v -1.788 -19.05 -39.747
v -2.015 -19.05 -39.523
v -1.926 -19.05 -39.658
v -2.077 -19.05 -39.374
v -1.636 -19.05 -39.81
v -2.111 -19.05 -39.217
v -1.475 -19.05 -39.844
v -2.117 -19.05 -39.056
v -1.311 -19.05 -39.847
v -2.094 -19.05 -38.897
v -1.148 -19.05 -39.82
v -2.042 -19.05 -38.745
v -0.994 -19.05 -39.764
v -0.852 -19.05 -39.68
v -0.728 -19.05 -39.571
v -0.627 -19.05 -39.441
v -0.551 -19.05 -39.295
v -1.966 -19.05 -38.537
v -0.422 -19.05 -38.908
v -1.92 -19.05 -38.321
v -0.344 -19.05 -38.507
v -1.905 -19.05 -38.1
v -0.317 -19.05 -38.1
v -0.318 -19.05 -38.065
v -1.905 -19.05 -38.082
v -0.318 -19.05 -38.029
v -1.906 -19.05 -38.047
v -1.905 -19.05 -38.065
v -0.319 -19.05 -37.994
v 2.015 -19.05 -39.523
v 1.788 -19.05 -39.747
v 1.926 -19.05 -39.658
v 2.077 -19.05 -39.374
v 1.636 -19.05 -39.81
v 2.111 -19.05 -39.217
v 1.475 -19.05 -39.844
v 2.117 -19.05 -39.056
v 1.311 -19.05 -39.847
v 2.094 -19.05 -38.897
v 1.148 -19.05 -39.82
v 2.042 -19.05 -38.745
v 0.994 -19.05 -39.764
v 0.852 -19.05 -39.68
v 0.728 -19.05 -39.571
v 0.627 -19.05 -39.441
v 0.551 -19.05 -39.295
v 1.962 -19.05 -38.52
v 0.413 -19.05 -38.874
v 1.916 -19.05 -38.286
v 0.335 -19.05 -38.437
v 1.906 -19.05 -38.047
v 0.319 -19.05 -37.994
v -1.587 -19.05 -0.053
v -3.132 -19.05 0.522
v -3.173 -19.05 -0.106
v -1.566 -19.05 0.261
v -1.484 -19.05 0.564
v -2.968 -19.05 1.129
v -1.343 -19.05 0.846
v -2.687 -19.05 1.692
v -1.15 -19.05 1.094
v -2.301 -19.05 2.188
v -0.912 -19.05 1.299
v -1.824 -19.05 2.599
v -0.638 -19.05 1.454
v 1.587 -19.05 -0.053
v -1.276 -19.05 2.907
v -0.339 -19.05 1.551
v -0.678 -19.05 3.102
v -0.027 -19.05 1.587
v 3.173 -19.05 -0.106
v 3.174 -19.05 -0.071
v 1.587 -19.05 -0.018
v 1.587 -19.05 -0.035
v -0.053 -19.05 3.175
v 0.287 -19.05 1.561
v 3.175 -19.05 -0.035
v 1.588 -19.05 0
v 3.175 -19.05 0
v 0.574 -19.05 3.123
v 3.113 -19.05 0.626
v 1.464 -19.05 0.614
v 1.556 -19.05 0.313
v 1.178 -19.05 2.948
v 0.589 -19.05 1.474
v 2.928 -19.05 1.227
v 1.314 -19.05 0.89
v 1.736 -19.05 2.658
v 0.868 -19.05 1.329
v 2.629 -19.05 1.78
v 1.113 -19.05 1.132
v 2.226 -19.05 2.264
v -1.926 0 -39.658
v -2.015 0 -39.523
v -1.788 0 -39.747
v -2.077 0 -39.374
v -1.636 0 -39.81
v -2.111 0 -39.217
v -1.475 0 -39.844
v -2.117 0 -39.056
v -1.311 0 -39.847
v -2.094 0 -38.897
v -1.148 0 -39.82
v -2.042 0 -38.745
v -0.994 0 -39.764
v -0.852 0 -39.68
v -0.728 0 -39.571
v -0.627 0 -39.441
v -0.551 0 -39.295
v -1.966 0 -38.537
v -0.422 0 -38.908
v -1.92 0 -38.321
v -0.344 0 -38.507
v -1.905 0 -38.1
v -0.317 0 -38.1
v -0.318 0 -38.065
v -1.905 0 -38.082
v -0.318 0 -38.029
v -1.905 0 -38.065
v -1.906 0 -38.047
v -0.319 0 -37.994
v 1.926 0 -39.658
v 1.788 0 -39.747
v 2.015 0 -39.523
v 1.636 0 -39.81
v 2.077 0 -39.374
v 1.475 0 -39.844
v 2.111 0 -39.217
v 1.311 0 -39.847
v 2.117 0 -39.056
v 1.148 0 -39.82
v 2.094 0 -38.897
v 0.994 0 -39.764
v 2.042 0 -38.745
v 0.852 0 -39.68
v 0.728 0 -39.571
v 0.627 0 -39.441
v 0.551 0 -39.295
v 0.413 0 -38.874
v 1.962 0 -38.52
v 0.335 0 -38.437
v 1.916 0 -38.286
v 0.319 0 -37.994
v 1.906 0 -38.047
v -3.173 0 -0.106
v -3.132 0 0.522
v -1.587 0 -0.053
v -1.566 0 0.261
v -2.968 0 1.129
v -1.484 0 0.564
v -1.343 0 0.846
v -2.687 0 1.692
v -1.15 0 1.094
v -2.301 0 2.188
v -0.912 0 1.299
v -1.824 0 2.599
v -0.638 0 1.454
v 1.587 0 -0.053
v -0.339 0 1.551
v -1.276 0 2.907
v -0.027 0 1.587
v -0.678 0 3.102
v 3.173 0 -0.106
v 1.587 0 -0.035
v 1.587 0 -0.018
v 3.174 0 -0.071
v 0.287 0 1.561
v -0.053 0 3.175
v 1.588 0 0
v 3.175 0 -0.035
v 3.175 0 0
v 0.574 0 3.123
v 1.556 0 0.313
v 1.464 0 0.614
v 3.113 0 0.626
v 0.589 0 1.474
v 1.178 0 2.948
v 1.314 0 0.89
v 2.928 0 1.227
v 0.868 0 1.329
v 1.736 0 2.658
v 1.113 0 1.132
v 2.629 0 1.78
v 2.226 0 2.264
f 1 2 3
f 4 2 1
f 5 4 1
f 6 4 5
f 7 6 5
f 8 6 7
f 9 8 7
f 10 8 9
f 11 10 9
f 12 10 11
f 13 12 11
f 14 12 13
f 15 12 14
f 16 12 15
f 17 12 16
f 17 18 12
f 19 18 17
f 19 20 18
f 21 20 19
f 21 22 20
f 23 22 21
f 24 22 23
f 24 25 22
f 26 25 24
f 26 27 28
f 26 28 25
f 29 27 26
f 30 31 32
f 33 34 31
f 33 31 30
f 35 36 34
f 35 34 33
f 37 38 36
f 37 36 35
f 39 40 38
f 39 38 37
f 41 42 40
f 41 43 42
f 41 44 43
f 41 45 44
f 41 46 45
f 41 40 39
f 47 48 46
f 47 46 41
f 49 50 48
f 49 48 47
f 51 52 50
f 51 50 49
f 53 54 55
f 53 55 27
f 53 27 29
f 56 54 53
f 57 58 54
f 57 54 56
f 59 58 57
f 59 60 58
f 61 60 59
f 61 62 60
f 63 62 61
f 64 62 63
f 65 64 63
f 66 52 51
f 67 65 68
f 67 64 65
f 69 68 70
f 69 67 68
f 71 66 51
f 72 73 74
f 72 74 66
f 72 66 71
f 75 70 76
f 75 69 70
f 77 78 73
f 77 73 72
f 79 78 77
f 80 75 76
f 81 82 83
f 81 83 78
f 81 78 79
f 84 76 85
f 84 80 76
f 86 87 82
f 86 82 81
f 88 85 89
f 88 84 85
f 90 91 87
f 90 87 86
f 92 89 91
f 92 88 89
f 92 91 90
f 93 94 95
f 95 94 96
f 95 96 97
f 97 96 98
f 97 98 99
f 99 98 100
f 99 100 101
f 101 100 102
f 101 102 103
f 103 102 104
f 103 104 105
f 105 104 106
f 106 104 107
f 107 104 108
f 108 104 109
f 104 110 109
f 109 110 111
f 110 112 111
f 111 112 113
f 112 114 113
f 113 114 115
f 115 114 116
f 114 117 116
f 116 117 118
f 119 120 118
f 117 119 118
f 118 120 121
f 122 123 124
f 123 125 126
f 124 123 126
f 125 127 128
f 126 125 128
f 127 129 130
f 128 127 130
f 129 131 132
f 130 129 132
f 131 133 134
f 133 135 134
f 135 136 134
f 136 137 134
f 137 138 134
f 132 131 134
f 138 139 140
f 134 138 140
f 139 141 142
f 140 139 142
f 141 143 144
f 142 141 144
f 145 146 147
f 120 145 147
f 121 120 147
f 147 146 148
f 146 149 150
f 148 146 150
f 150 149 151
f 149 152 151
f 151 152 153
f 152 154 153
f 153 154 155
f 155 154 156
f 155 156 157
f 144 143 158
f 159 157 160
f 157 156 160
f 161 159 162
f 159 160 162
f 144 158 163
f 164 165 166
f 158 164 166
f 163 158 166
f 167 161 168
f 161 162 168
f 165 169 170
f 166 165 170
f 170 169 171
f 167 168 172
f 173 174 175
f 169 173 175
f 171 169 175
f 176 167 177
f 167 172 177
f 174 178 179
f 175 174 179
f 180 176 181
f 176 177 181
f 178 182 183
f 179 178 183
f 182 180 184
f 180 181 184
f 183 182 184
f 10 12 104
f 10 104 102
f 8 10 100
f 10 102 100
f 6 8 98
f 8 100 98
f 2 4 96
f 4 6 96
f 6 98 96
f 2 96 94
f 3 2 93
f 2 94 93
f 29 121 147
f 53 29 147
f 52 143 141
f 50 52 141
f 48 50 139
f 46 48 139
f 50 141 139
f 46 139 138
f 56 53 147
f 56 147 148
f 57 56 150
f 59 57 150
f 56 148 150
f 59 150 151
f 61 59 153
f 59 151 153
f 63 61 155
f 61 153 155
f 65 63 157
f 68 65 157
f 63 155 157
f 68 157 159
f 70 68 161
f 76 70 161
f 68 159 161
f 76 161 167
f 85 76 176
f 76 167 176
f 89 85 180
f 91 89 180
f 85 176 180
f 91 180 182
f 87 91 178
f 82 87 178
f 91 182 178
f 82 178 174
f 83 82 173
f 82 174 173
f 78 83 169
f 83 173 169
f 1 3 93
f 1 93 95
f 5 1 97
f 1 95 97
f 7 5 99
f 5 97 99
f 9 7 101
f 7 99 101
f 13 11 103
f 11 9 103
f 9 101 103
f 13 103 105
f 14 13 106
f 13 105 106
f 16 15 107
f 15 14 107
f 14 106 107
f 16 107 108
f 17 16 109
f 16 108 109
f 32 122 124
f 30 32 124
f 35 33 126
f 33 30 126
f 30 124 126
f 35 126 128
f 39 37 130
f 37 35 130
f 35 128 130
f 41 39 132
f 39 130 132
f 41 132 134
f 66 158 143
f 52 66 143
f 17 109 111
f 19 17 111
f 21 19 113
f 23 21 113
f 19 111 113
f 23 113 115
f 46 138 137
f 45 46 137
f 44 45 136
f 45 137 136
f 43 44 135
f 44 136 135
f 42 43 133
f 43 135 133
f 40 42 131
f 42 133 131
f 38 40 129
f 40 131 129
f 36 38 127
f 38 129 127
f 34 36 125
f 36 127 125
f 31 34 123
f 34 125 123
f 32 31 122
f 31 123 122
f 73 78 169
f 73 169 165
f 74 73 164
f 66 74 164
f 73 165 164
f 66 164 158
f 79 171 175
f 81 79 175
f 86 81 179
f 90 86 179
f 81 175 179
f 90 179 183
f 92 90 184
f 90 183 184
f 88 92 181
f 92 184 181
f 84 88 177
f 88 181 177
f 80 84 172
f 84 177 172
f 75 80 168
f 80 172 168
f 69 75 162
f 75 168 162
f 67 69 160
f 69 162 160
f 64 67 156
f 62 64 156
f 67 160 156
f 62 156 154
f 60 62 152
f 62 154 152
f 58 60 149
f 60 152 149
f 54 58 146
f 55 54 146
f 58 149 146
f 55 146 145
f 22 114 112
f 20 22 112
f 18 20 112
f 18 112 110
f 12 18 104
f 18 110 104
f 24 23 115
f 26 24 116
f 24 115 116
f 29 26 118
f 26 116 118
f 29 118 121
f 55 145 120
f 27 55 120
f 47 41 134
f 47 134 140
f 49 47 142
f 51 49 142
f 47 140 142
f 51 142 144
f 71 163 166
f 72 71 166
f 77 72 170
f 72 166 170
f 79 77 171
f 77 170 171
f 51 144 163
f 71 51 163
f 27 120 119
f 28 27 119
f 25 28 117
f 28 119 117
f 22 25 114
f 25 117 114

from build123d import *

# Parameters (mm, degrees)
F1_DEPTH    = 19.05
F2_T1_DEPTH = 22.6696744492
F2_T3_DEPTH = 25.3488085544


# Not quite as in the source:
# - a fillet or chamfer that OpenCascade refuses, or shapes differently, is made with other operations: its cross-section is extruded or revolved along the edge and cut away or added


with BuildPart() as f1:
    # F0 (on Front) → F1 (new body)
    with BuildSketch(Plane.XZ):
        with BuildLine():
            ThreePointArc((-1.586615103, -0.0529977822), (-0.0265025846, 1.5872787603), (1.5875, 0))
            ThreePointArc((1.5875, 0), (1.5872787603, -0.0265025846), (1.586615103, -0.0529977822))
            Line((1.586615103, -0.0529977822), (1.4948202515, -2.8010957527))
            ThreePointArc((1.4948202515, -2.8010957527), (2.6951001882, -1.6784099545), (3.173230206, -0.1059955644))
            ThreePointArc((3.173230206, -0.1059955644), (3.1745575207, -0.0530051692), (3.175, 0))
            ThreePointArc((3.175, 0), (-0.0530051692, 3.1745575207), (-3.173230206, -0.1059955644))
            ThreePointArc((-3.173230206, -0.1059955644), (-2.6951001882, -1.6784099545), (-1.4948202515, -2.8010957527))
            Line((-1.4948202515, -2.8010957527), (-1.586615103, -0.0529977822))
        make_face()
        with BuildLine():
            Line((-0.319269794, -37.9940044356), (-1.4948202515, -2.8010957527))
            ThreePointArc((-1.4948202515, -2.8010957527), (-2.6951001882, -1.6784099545), (-3.173230206, -0.1059955644))
            Line((-3.173230206, -0.1059955644), (-1.9976797485, -35.2989042473))
            ThreePointArc((-1.9976797485, -35.2989042473), (-0.7973998118, -36.4215900455), (-0.319269794, -37.9940044356))
        make_face()
        with BuildLine():
            ThreePointArc((3.173230206, -0.1059955644), (2.6951001882, -1.6784099545), (1.4948202515, -2.8010957527))
            Line((1.4948202515, -2.8010957527), (0.319269794, -37.9940044356))
            ThreePointArc((0.319269794, -37.9940044356), (0.7973998118, -36.4215900455), (1.9976797485, -35.2989042473))
            Line((1.9976797485, -35.2989042473), (3.173230206, -0.1059955644))
        make_face()
        with BuildLine():
            ThreePointArc((-0.3175, -38.1), (-0.3179424793, -38.0469948308), (-0.319269794, -37.9940044356))
            ThreePointArc((-0.319269794, -37.9940044356), (-0.7973998118, -36.4215900455), (-1.9976797485, -35.2989042473))
            Line((-1.9976797485, -35.2989042473), (-1.905884897, -38.0470022178))
            ThreePointArc((-1.905884897, -38.0470022178), (-1.9052212397, -38.0734974154), (-1.905, -38.1))
            ThreePointArc((-1.905, -38.1), (-2.0258412421, -38.7075099489), (-2.3699679849, -39.2225320151))
            Line((-2.3699679849, -39.2225320151), (-1.2474359697, -40.3450640303))
            ThreePointArc((-1.2474359697, -40.3450640303), (-0.5591824843, -39.3150198978), (-0.3175, -38.1))
        make_face()
        with BuildLine():
            ThreePointArc((1.9976797485, -35.2989042473), (0.7973998118, -36.4215900455), (0.319269794, -37.9940044356))
            ThreePointArc((0.319269794, -37.9940044356), (0.5393070818, -39.2658801773), (1.2474359697, -40.3450640303))
            Line((1.2474359697, -40.3450640303), (2.3699679849, -39.2225320151))
            ThreePointArc((2.3699679849, -39.2225320151), (2.0159035409, -38.6829400886), (1.905884897, -38.0470022178))
            Line((1.905884897, -38.0470022178), (1.9976797485, -35.2989042473))
        make_face()
    extrude(amount=F1_DEPTH)

    # F2: fillet of radius 0.889 on 4 edges, made by hand

    # F2_s2 → F2_t1 (cut)
    with BuildSketch(Plane.XZ.offset(-1.8098372246)):
        with BuildLine():
            ThreePointArc((-2.0418274273, -38.7447521515), (-2.1035117306, -39.2681046567), (-1.8580687151, -39.7344312849))
            Line((-1.8580687151, -39.7344312849), (-2.3699679849, -39.2225320151))
            ThreePointArc((-2.3699679849, -39.2225320151), (-2.1839076792, -38.9987448959), (-2.0418274273, -38.7447521515))
        make_face()
        with BuildLine():
            ThreePointArc((1.8580687151, -39.7344312849), (2.1035117306, -39.2681046567), (2.0418274273, -38.7447521515))
            ThreePointArc((2.0418274273, -38.7447521515), (2.1839076792, -38.9987448959), (2.3699679849, -39.2225320151))
            Line((2.3699679849, -39.2225320151), (1.8580687151, -39.7344312849))
        make_face()
    extrude(amount=F2_T1_DEPTH, mode=Mode.SUBTRACT)

    # F2_s4 → F2_t3 (cut)
    with BuildSketch(Plane.XZ.offset(-3.1494042772)):
        with BuildLine():
            ThreePointArc((-2.0032929963, -39.5892070037), (-1.1983084283, -39.8319189832), (-0.551076483, -39.2952626045))
            ThreePointArc((-0.551076483, -39.2952626045), (-0.8466666667, -39.8550472849), (-1.2474359697, -40.3450640303))
            Line((-1.2474359697, -40.3450640303), (-2.0032929963, -39.5892070037))
        make_face()
        with BuildLine():
            ThreePointArc((0.551076483, -39.2952626045), (1.1983084283, -39.8319189832), (2.0032929963, -39.5892070037))
            Line((2.0032929963, -39.5892070037), (1.2474359697, -40.3450640303))
            ThreePointArc((1.2474359697, -40.3450640303), (0.8466666667, -39.8550472849), (0.551076483, -39.2952626045))
        make_face()
    extrude(amount=F2_T3_DEPTH, mode=Mode.SUBTRACT)


solid = f1.part
